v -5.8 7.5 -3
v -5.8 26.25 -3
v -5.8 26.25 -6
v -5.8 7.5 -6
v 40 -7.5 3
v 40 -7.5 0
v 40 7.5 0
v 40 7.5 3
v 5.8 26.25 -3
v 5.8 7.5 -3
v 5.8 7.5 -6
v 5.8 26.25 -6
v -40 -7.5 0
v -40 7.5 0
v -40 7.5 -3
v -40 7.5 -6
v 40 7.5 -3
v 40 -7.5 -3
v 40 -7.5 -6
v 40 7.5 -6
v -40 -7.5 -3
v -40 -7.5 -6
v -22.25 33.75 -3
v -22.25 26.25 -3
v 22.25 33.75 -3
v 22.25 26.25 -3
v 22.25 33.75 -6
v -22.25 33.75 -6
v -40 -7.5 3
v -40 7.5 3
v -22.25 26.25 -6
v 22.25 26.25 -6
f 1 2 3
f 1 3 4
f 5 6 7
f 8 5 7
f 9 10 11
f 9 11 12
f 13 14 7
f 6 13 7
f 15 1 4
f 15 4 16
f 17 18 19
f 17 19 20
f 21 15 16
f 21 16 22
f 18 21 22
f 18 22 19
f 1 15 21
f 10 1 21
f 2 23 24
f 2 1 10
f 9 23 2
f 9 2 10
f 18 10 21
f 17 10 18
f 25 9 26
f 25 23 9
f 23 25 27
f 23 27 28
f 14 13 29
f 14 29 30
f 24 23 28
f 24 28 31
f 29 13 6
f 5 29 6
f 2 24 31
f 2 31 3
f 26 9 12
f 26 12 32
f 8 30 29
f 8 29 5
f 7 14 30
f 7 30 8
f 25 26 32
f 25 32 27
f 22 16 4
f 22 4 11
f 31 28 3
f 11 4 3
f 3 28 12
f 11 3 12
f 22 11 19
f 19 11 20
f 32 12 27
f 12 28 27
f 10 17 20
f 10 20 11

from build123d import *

# Parameters (mm, degrees)
SKETCH1_W           = 80
SKETCH1_H           = 15
BOSS_EXTRUDE1_DEPTH = 3
BOSS_EXTRUDE2_DEPTH = 3


with BuildPart() as part:
    # Sketch1 → Boss-Extrude1 (new body)
    with BuildSketch(Plane.XY):
        Rectangle(SKETCH1_W, SKETCH1_H)
    extrude(amount=BOSS_EXTRUDE1_DEPTH)


with BuildPart() as body_2:
    # Sketch3 → Boss-Extrude2 (new body)
    with BuildSketch(Plane(origin=(0, 0, -3), x_dir=(-1, 0, 0), z_dir=(0, 0, -1))):
        Polygon((40, -7.5), (-40, -7.5), (-40, 7.5), (-5.8, 7.5), (-5.8, 26.25), (-22.25, 26.25), (-22.25, 33.75), (22.25, 33.75), (22.25, 26.25), (5.8, 26.25), (5.8, 7.5), (40, 7.5), align=None)
    extrude(amount=BOSS_EXTRUDE2_DEPTH)


solid = Compound([part.part, body_2.part])
